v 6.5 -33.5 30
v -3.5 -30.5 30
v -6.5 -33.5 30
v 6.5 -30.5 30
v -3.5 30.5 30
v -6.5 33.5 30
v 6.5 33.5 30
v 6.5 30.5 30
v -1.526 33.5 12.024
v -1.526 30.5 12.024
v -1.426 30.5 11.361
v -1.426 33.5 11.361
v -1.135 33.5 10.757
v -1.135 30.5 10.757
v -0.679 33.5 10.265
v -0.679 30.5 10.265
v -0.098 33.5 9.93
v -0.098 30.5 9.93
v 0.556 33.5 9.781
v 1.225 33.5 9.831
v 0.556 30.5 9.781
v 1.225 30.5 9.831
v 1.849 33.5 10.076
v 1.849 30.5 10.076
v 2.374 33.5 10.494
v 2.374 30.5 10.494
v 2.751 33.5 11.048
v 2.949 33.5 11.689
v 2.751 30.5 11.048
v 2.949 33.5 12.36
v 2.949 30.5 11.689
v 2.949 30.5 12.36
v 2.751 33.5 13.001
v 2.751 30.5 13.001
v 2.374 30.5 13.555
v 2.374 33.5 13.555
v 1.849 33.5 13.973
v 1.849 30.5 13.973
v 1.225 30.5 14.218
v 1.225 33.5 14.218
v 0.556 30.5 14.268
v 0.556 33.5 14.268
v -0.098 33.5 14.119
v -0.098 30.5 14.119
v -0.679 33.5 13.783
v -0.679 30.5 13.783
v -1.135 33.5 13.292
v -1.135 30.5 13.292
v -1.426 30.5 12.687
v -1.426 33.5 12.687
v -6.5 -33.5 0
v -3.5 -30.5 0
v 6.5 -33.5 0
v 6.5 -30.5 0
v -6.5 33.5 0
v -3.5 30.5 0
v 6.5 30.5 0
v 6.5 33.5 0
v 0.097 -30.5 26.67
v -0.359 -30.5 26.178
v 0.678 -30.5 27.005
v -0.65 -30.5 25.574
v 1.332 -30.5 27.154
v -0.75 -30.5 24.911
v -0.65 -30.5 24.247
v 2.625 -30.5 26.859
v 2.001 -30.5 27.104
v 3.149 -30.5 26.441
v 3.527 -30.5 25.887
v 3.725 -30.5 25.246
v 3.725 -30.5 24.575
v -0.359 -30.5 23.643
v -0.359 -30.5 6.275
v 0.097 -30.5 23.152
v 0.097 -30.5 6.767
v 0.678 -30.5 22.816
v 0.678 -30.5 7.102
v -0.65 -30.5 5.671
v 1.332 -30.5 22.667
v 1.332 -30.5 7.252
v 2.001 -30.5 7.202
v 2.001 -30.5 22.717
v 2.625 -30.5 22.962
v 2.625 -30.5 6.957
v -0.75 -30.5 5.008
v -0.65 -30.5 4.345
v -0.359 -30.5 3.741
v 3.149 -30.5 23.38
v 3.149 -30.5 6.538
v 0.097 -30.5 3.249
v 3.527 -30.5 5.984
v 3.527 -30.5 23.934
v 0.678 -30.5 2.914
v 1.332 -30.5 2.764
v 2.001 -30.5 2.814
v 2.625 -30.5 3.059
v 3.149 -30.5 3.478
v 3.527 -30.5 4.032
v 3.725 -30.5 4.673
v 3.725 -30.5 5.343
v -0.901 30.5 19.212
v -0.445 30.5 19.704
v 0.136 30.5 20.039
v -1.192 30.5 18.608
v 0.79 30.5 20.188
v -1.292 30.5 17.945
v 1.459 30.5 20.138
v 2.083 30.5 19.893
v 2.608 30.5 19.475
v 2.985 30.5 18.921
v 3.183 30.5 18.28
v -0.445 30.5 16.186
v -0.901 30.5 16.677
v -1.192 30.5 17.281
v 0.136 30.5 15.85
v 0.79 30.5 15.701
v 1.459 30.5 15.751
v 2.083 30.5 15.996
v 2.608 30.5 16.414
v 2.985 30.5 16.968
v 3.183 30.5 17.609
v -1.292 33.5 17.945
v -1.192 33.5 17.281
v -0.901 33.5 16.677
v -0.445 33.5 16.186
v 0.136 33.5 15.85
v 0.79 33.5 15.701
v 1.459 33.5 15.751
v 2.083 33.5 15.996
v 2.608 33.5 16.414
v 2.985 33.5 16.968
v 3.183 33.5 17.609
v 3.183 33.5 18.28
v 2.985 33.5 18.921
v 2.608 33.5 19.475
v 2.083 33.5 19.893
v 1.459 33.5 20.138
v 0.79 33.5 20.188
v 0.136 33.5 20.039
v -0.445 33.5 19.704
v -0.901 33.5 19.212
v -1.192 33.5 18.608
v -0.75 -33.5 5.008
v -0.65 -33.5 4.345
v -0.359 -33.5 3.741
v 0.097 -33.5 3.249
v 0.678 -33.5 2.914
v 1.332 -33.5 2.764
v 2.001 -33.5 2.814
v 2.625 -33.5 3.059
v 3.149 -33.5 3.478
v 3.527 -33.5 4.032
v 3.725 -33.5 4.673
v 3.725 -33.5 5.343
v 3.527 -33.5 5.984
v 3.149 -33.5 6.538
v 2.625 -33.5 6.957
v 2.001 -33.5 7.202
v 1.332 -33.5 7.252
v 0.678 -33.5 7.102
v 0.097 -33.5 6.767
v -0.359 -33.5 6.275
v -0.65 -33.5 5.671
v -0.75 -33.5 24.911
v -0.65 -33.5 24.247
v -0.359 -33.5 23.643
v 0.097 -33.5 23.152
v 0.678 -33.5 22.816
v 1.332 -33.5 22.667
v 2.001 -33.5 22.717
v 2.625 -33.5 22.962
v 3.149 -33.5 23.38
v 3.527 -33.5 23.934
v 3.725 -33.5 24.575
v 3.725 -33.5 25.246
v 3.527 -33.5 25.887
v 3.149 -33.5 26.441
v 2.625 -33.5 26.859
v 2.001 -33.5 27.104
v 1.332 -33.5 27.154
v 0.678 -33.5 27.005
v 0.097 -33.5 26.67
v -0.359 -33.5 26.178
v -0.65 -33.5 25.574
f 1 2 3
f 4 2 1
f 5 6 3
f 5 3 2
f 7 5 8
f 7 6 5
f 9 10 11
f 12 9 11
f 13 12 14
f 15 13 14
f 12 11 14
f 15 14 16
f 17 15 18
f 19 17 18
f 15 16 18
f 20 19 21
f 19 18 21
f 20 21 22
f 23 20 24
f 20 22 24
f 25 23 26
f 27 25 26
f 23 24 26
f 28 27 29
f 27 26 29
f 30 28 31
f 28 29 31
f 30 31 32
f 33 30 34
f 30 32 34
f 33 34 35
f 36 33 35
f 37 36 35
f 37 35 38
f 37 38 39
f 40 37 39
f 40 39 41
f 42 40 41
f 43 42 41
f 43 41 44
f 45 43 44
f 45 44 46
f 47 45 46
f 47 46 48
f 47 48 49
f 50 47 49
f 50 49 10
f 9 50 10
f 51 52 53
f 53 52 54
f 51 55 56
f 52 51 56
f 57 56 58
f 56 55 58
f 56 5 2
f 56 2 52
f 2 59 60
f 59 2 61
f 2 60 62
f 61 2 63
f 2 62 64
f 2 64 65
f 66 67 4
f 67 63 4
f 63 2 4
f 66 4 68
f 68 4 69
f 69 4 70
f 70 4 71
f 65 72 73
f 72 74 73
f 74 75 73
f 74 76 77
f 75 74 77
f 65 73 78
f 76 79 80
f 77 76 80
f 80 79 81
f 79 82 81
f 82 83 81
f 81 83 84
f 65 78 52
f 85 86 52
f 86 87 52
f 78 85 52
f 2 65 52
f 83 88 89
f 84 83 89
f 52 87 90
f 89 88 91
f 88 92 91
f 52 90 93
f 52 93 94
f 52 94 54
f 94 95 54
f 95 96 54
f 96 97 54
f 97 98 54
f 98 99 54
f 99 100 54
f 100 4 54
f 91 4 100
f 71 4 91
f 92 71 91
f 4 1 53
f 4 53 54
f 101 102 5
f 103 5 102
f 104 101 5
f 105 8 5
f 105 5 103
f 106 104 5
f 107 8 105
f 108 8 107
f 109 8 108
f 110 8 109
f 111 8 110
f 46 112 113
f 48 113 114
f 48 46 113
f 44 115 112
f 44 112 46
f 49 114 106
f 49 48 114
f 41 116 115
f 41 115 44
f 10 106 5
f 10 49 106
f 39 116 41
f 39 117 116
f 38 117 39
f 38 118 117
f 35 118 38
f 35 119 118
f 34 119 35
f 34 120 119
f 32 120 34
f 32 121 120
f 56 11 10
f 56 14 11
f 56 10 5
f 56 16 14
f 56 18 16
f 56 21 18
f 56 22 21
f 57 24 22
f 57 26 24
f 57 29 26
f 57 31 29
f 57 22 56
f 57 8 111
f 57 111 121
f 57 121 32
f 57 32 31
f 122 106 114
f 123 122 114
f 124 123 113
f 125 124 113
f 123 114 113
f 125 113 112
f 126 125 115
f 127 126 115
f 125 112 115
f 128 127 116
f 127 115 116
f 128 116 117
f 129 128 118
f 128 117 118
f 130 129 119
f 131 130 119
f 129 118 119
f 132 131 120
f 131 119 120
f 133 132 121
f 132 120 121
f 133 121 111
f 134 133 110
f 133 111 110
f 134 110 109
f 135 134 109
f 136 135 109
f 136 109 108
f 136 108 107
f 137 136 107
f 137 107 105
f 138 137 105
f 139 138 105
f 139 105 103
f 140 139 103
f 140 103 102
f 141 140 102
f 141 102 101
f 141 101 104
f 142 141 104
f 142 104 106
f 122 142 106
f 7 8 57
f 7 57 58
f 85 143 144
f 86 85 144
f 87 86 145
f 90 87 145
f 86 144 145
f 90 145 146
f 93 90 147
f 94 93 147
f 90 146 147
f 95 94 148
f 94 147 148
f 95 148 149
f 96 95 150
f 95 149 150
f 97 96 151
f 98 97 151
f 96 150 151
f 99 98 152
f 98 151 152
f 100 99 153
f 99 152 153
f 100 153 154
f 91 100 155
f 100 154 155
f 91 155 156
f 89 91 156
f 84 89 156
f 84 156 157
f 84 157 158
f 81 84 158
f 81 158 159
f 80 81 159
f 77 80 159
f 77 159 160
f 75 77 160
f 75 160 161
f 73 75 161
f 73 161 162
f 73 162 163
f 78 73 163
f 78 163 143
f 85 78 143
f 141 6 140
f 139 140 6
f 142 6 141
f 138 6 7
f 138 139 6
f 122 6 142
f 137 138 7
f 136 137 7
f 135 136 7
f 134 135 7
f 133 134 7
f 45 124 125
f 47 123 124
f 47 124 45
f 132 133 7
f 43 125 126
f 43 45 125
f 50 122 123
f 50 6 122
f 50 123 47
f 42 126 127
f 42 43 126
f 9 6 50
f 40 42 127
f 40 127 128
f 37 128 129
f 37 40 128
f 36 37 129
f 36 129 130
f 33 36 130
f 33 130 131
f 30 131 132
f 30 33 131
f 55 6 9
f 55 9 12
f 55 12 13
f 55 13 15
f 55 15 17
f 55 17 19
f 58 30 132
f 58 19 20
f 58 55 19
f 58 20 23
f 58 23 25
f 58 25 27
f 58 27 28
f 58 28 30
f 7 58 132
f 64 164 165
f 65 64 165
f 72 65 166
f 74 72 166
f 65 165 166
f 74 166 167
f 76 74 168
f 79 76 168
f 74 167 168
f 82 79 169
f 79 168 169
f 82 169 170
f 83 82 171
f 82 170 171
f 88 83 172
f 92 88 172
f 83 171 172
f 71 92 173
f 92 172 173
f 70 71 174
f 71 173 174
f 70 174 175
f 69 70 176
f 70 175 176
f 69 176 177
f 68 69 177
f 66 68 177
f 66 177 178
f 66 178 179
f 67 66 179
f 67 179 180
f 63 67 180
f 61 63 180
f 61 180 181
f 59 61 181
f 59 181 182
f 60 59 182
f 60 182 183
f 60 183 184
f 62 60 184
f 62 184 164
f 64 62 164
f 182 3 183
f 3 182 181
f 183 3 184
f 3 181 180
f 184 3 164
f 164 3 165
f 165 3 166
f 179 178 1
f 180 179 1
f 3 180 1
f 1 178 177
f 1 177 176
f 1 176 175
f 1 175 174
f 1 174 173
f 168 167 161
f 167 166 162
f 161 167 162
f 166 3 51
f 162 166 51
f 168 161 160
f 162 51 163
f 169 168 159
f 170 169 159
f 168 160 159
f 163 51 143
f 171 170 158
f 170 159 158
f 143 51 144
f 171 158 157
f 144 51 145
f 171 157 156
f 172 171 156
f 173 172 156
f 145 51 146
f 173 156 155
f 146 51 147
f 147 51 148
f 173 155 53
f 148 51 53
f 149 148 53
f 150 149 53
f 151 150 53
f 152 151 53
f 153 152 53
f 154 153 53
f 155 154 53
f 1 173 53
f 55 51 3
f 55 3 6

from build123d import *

# Parameters (mm, degrees)
SKETCH1_W                = 13
SKETCH1_H                = 67
BOSS_EXTRUDE1_DEPTH      = 30
SKETCH2_W                = 67.456445976
SKETCH2_H                = 61
CUT_EXTRUDE1_DEPTH       = 10
M4_CLEARANCE_HOLE3_D     = 4.5
M4_CLEARANCE_HOLE3_DEPTH = 6
M4_CLEARANCE_HOLE3_TIP   = 1.351936393
M4_CLEARANCE_HOLE1_D     = 4.5
M4_CLEARANCE_HOLE1_DEPTH = 6
M4_CLEARANCE_HOLE1_TIP   = 1.351936393
M4_CLEARANCE_HOLE2_D     = 4.5
M4_CLEARANCE_HOLE2_DEPTH = 6
M4_CLEARANCE_HOLE2_TIP   = 1.351936393


with BuildPart() as part:
    # Sketch1 → Boss-Extrude1 (new body)
    with BuildSketch(Plane.XY):
        Rectangle(SKETCH1_W, SKETCH1_H)
    extrude(amount=BOSS_EXTRUDE1_DEPTH)

    # Sketch2 → Cut-Extrude1 (cut)
    with BuildSketch(Plane(origin=(6.5, 0, 0), x_dir=(0, 0, -1), z_dir=(1, 0, 0))):
        with Locations((-11.6230653, 0)):
            Rectangle(SKETCH2_W, SKETCH2_H)
    extrude(amount=-CUT_EXTRUDE1_DEPTH, mode=Mode.SUBTRACT)

    # M4 Clearance Hole3
    with Locations(Plane(origin=(0, 33.5, 0), x_dir=(1, 0, 0), z_dir=(0, 1, 0))):
        with Locations((0.724225785, -12.024273001)):
            Hole(M4_CLEARANCE_HOLE3_D / 2, depth=M4_CLEARANCE_HOLE3_DEPTH)
            with Locations((0, 0, -(M4_CLEARANCE_HOLE3_DEPTH + M4_CLEARANCE_HOLE3_TIP / 2))):  # 118° drill point
                Cone(0, M4_CLEARANCE_HOLE3_D / 2, M4_CLEARANCE_HOLE3_TIP, mode=Mode.SUBTRACT)

    # M4 Clearance Hole1
    with Locations(Plane(origin=(0, -30.5, 0), x_dir=(1, 0, 0), z_dir=(0, 1, 0))):
        with Locations((1.5, -5.008015198), (1.5, -24.910664678)):
            Hole(M4_CLEARANCE_HOLE1_D / 2, depth=M4_CLEARANCE_HOLE1_DEPTH)
            with Locations((0, 0, -(M4_CLEARANCE_HOLE1_DEPTH + M4_CLEARANCE_HOLE1_TIP / 2))):  # 118° drill point
                Cone(0, M4_CLEARANCE_HOLE1_D / 2, M4_CLEARANCE_HOLE1_TIP, mode=Mode.SUBTRACT)

    # M4 Clearance Hole2
    with Locations(Plane(origin=(0, 33.5, 0), x_dir=(1, 0, 0), z_dir=(0, 1, 0))):
        with Locations((0.958202429, -17.944695077)):
            Hole(M4_CLEARANCE_HOLE2_D / 2, depth=M4_CLEARANCE_HOLE2_DEPTH)
            with Locations((0, 0, -(M4_CLEARANCE_HOLE2_DEPTH + M4_CLEARANCE_HOLE2_TIP / 2))):  # 118° drill point
                Cone(0, M4_CLEARANCE_HOLE2_D / 2, M4_CLEARANCE_HOLE2_TIP, mode=Mode.SUBTRACT)


solid = part.part
